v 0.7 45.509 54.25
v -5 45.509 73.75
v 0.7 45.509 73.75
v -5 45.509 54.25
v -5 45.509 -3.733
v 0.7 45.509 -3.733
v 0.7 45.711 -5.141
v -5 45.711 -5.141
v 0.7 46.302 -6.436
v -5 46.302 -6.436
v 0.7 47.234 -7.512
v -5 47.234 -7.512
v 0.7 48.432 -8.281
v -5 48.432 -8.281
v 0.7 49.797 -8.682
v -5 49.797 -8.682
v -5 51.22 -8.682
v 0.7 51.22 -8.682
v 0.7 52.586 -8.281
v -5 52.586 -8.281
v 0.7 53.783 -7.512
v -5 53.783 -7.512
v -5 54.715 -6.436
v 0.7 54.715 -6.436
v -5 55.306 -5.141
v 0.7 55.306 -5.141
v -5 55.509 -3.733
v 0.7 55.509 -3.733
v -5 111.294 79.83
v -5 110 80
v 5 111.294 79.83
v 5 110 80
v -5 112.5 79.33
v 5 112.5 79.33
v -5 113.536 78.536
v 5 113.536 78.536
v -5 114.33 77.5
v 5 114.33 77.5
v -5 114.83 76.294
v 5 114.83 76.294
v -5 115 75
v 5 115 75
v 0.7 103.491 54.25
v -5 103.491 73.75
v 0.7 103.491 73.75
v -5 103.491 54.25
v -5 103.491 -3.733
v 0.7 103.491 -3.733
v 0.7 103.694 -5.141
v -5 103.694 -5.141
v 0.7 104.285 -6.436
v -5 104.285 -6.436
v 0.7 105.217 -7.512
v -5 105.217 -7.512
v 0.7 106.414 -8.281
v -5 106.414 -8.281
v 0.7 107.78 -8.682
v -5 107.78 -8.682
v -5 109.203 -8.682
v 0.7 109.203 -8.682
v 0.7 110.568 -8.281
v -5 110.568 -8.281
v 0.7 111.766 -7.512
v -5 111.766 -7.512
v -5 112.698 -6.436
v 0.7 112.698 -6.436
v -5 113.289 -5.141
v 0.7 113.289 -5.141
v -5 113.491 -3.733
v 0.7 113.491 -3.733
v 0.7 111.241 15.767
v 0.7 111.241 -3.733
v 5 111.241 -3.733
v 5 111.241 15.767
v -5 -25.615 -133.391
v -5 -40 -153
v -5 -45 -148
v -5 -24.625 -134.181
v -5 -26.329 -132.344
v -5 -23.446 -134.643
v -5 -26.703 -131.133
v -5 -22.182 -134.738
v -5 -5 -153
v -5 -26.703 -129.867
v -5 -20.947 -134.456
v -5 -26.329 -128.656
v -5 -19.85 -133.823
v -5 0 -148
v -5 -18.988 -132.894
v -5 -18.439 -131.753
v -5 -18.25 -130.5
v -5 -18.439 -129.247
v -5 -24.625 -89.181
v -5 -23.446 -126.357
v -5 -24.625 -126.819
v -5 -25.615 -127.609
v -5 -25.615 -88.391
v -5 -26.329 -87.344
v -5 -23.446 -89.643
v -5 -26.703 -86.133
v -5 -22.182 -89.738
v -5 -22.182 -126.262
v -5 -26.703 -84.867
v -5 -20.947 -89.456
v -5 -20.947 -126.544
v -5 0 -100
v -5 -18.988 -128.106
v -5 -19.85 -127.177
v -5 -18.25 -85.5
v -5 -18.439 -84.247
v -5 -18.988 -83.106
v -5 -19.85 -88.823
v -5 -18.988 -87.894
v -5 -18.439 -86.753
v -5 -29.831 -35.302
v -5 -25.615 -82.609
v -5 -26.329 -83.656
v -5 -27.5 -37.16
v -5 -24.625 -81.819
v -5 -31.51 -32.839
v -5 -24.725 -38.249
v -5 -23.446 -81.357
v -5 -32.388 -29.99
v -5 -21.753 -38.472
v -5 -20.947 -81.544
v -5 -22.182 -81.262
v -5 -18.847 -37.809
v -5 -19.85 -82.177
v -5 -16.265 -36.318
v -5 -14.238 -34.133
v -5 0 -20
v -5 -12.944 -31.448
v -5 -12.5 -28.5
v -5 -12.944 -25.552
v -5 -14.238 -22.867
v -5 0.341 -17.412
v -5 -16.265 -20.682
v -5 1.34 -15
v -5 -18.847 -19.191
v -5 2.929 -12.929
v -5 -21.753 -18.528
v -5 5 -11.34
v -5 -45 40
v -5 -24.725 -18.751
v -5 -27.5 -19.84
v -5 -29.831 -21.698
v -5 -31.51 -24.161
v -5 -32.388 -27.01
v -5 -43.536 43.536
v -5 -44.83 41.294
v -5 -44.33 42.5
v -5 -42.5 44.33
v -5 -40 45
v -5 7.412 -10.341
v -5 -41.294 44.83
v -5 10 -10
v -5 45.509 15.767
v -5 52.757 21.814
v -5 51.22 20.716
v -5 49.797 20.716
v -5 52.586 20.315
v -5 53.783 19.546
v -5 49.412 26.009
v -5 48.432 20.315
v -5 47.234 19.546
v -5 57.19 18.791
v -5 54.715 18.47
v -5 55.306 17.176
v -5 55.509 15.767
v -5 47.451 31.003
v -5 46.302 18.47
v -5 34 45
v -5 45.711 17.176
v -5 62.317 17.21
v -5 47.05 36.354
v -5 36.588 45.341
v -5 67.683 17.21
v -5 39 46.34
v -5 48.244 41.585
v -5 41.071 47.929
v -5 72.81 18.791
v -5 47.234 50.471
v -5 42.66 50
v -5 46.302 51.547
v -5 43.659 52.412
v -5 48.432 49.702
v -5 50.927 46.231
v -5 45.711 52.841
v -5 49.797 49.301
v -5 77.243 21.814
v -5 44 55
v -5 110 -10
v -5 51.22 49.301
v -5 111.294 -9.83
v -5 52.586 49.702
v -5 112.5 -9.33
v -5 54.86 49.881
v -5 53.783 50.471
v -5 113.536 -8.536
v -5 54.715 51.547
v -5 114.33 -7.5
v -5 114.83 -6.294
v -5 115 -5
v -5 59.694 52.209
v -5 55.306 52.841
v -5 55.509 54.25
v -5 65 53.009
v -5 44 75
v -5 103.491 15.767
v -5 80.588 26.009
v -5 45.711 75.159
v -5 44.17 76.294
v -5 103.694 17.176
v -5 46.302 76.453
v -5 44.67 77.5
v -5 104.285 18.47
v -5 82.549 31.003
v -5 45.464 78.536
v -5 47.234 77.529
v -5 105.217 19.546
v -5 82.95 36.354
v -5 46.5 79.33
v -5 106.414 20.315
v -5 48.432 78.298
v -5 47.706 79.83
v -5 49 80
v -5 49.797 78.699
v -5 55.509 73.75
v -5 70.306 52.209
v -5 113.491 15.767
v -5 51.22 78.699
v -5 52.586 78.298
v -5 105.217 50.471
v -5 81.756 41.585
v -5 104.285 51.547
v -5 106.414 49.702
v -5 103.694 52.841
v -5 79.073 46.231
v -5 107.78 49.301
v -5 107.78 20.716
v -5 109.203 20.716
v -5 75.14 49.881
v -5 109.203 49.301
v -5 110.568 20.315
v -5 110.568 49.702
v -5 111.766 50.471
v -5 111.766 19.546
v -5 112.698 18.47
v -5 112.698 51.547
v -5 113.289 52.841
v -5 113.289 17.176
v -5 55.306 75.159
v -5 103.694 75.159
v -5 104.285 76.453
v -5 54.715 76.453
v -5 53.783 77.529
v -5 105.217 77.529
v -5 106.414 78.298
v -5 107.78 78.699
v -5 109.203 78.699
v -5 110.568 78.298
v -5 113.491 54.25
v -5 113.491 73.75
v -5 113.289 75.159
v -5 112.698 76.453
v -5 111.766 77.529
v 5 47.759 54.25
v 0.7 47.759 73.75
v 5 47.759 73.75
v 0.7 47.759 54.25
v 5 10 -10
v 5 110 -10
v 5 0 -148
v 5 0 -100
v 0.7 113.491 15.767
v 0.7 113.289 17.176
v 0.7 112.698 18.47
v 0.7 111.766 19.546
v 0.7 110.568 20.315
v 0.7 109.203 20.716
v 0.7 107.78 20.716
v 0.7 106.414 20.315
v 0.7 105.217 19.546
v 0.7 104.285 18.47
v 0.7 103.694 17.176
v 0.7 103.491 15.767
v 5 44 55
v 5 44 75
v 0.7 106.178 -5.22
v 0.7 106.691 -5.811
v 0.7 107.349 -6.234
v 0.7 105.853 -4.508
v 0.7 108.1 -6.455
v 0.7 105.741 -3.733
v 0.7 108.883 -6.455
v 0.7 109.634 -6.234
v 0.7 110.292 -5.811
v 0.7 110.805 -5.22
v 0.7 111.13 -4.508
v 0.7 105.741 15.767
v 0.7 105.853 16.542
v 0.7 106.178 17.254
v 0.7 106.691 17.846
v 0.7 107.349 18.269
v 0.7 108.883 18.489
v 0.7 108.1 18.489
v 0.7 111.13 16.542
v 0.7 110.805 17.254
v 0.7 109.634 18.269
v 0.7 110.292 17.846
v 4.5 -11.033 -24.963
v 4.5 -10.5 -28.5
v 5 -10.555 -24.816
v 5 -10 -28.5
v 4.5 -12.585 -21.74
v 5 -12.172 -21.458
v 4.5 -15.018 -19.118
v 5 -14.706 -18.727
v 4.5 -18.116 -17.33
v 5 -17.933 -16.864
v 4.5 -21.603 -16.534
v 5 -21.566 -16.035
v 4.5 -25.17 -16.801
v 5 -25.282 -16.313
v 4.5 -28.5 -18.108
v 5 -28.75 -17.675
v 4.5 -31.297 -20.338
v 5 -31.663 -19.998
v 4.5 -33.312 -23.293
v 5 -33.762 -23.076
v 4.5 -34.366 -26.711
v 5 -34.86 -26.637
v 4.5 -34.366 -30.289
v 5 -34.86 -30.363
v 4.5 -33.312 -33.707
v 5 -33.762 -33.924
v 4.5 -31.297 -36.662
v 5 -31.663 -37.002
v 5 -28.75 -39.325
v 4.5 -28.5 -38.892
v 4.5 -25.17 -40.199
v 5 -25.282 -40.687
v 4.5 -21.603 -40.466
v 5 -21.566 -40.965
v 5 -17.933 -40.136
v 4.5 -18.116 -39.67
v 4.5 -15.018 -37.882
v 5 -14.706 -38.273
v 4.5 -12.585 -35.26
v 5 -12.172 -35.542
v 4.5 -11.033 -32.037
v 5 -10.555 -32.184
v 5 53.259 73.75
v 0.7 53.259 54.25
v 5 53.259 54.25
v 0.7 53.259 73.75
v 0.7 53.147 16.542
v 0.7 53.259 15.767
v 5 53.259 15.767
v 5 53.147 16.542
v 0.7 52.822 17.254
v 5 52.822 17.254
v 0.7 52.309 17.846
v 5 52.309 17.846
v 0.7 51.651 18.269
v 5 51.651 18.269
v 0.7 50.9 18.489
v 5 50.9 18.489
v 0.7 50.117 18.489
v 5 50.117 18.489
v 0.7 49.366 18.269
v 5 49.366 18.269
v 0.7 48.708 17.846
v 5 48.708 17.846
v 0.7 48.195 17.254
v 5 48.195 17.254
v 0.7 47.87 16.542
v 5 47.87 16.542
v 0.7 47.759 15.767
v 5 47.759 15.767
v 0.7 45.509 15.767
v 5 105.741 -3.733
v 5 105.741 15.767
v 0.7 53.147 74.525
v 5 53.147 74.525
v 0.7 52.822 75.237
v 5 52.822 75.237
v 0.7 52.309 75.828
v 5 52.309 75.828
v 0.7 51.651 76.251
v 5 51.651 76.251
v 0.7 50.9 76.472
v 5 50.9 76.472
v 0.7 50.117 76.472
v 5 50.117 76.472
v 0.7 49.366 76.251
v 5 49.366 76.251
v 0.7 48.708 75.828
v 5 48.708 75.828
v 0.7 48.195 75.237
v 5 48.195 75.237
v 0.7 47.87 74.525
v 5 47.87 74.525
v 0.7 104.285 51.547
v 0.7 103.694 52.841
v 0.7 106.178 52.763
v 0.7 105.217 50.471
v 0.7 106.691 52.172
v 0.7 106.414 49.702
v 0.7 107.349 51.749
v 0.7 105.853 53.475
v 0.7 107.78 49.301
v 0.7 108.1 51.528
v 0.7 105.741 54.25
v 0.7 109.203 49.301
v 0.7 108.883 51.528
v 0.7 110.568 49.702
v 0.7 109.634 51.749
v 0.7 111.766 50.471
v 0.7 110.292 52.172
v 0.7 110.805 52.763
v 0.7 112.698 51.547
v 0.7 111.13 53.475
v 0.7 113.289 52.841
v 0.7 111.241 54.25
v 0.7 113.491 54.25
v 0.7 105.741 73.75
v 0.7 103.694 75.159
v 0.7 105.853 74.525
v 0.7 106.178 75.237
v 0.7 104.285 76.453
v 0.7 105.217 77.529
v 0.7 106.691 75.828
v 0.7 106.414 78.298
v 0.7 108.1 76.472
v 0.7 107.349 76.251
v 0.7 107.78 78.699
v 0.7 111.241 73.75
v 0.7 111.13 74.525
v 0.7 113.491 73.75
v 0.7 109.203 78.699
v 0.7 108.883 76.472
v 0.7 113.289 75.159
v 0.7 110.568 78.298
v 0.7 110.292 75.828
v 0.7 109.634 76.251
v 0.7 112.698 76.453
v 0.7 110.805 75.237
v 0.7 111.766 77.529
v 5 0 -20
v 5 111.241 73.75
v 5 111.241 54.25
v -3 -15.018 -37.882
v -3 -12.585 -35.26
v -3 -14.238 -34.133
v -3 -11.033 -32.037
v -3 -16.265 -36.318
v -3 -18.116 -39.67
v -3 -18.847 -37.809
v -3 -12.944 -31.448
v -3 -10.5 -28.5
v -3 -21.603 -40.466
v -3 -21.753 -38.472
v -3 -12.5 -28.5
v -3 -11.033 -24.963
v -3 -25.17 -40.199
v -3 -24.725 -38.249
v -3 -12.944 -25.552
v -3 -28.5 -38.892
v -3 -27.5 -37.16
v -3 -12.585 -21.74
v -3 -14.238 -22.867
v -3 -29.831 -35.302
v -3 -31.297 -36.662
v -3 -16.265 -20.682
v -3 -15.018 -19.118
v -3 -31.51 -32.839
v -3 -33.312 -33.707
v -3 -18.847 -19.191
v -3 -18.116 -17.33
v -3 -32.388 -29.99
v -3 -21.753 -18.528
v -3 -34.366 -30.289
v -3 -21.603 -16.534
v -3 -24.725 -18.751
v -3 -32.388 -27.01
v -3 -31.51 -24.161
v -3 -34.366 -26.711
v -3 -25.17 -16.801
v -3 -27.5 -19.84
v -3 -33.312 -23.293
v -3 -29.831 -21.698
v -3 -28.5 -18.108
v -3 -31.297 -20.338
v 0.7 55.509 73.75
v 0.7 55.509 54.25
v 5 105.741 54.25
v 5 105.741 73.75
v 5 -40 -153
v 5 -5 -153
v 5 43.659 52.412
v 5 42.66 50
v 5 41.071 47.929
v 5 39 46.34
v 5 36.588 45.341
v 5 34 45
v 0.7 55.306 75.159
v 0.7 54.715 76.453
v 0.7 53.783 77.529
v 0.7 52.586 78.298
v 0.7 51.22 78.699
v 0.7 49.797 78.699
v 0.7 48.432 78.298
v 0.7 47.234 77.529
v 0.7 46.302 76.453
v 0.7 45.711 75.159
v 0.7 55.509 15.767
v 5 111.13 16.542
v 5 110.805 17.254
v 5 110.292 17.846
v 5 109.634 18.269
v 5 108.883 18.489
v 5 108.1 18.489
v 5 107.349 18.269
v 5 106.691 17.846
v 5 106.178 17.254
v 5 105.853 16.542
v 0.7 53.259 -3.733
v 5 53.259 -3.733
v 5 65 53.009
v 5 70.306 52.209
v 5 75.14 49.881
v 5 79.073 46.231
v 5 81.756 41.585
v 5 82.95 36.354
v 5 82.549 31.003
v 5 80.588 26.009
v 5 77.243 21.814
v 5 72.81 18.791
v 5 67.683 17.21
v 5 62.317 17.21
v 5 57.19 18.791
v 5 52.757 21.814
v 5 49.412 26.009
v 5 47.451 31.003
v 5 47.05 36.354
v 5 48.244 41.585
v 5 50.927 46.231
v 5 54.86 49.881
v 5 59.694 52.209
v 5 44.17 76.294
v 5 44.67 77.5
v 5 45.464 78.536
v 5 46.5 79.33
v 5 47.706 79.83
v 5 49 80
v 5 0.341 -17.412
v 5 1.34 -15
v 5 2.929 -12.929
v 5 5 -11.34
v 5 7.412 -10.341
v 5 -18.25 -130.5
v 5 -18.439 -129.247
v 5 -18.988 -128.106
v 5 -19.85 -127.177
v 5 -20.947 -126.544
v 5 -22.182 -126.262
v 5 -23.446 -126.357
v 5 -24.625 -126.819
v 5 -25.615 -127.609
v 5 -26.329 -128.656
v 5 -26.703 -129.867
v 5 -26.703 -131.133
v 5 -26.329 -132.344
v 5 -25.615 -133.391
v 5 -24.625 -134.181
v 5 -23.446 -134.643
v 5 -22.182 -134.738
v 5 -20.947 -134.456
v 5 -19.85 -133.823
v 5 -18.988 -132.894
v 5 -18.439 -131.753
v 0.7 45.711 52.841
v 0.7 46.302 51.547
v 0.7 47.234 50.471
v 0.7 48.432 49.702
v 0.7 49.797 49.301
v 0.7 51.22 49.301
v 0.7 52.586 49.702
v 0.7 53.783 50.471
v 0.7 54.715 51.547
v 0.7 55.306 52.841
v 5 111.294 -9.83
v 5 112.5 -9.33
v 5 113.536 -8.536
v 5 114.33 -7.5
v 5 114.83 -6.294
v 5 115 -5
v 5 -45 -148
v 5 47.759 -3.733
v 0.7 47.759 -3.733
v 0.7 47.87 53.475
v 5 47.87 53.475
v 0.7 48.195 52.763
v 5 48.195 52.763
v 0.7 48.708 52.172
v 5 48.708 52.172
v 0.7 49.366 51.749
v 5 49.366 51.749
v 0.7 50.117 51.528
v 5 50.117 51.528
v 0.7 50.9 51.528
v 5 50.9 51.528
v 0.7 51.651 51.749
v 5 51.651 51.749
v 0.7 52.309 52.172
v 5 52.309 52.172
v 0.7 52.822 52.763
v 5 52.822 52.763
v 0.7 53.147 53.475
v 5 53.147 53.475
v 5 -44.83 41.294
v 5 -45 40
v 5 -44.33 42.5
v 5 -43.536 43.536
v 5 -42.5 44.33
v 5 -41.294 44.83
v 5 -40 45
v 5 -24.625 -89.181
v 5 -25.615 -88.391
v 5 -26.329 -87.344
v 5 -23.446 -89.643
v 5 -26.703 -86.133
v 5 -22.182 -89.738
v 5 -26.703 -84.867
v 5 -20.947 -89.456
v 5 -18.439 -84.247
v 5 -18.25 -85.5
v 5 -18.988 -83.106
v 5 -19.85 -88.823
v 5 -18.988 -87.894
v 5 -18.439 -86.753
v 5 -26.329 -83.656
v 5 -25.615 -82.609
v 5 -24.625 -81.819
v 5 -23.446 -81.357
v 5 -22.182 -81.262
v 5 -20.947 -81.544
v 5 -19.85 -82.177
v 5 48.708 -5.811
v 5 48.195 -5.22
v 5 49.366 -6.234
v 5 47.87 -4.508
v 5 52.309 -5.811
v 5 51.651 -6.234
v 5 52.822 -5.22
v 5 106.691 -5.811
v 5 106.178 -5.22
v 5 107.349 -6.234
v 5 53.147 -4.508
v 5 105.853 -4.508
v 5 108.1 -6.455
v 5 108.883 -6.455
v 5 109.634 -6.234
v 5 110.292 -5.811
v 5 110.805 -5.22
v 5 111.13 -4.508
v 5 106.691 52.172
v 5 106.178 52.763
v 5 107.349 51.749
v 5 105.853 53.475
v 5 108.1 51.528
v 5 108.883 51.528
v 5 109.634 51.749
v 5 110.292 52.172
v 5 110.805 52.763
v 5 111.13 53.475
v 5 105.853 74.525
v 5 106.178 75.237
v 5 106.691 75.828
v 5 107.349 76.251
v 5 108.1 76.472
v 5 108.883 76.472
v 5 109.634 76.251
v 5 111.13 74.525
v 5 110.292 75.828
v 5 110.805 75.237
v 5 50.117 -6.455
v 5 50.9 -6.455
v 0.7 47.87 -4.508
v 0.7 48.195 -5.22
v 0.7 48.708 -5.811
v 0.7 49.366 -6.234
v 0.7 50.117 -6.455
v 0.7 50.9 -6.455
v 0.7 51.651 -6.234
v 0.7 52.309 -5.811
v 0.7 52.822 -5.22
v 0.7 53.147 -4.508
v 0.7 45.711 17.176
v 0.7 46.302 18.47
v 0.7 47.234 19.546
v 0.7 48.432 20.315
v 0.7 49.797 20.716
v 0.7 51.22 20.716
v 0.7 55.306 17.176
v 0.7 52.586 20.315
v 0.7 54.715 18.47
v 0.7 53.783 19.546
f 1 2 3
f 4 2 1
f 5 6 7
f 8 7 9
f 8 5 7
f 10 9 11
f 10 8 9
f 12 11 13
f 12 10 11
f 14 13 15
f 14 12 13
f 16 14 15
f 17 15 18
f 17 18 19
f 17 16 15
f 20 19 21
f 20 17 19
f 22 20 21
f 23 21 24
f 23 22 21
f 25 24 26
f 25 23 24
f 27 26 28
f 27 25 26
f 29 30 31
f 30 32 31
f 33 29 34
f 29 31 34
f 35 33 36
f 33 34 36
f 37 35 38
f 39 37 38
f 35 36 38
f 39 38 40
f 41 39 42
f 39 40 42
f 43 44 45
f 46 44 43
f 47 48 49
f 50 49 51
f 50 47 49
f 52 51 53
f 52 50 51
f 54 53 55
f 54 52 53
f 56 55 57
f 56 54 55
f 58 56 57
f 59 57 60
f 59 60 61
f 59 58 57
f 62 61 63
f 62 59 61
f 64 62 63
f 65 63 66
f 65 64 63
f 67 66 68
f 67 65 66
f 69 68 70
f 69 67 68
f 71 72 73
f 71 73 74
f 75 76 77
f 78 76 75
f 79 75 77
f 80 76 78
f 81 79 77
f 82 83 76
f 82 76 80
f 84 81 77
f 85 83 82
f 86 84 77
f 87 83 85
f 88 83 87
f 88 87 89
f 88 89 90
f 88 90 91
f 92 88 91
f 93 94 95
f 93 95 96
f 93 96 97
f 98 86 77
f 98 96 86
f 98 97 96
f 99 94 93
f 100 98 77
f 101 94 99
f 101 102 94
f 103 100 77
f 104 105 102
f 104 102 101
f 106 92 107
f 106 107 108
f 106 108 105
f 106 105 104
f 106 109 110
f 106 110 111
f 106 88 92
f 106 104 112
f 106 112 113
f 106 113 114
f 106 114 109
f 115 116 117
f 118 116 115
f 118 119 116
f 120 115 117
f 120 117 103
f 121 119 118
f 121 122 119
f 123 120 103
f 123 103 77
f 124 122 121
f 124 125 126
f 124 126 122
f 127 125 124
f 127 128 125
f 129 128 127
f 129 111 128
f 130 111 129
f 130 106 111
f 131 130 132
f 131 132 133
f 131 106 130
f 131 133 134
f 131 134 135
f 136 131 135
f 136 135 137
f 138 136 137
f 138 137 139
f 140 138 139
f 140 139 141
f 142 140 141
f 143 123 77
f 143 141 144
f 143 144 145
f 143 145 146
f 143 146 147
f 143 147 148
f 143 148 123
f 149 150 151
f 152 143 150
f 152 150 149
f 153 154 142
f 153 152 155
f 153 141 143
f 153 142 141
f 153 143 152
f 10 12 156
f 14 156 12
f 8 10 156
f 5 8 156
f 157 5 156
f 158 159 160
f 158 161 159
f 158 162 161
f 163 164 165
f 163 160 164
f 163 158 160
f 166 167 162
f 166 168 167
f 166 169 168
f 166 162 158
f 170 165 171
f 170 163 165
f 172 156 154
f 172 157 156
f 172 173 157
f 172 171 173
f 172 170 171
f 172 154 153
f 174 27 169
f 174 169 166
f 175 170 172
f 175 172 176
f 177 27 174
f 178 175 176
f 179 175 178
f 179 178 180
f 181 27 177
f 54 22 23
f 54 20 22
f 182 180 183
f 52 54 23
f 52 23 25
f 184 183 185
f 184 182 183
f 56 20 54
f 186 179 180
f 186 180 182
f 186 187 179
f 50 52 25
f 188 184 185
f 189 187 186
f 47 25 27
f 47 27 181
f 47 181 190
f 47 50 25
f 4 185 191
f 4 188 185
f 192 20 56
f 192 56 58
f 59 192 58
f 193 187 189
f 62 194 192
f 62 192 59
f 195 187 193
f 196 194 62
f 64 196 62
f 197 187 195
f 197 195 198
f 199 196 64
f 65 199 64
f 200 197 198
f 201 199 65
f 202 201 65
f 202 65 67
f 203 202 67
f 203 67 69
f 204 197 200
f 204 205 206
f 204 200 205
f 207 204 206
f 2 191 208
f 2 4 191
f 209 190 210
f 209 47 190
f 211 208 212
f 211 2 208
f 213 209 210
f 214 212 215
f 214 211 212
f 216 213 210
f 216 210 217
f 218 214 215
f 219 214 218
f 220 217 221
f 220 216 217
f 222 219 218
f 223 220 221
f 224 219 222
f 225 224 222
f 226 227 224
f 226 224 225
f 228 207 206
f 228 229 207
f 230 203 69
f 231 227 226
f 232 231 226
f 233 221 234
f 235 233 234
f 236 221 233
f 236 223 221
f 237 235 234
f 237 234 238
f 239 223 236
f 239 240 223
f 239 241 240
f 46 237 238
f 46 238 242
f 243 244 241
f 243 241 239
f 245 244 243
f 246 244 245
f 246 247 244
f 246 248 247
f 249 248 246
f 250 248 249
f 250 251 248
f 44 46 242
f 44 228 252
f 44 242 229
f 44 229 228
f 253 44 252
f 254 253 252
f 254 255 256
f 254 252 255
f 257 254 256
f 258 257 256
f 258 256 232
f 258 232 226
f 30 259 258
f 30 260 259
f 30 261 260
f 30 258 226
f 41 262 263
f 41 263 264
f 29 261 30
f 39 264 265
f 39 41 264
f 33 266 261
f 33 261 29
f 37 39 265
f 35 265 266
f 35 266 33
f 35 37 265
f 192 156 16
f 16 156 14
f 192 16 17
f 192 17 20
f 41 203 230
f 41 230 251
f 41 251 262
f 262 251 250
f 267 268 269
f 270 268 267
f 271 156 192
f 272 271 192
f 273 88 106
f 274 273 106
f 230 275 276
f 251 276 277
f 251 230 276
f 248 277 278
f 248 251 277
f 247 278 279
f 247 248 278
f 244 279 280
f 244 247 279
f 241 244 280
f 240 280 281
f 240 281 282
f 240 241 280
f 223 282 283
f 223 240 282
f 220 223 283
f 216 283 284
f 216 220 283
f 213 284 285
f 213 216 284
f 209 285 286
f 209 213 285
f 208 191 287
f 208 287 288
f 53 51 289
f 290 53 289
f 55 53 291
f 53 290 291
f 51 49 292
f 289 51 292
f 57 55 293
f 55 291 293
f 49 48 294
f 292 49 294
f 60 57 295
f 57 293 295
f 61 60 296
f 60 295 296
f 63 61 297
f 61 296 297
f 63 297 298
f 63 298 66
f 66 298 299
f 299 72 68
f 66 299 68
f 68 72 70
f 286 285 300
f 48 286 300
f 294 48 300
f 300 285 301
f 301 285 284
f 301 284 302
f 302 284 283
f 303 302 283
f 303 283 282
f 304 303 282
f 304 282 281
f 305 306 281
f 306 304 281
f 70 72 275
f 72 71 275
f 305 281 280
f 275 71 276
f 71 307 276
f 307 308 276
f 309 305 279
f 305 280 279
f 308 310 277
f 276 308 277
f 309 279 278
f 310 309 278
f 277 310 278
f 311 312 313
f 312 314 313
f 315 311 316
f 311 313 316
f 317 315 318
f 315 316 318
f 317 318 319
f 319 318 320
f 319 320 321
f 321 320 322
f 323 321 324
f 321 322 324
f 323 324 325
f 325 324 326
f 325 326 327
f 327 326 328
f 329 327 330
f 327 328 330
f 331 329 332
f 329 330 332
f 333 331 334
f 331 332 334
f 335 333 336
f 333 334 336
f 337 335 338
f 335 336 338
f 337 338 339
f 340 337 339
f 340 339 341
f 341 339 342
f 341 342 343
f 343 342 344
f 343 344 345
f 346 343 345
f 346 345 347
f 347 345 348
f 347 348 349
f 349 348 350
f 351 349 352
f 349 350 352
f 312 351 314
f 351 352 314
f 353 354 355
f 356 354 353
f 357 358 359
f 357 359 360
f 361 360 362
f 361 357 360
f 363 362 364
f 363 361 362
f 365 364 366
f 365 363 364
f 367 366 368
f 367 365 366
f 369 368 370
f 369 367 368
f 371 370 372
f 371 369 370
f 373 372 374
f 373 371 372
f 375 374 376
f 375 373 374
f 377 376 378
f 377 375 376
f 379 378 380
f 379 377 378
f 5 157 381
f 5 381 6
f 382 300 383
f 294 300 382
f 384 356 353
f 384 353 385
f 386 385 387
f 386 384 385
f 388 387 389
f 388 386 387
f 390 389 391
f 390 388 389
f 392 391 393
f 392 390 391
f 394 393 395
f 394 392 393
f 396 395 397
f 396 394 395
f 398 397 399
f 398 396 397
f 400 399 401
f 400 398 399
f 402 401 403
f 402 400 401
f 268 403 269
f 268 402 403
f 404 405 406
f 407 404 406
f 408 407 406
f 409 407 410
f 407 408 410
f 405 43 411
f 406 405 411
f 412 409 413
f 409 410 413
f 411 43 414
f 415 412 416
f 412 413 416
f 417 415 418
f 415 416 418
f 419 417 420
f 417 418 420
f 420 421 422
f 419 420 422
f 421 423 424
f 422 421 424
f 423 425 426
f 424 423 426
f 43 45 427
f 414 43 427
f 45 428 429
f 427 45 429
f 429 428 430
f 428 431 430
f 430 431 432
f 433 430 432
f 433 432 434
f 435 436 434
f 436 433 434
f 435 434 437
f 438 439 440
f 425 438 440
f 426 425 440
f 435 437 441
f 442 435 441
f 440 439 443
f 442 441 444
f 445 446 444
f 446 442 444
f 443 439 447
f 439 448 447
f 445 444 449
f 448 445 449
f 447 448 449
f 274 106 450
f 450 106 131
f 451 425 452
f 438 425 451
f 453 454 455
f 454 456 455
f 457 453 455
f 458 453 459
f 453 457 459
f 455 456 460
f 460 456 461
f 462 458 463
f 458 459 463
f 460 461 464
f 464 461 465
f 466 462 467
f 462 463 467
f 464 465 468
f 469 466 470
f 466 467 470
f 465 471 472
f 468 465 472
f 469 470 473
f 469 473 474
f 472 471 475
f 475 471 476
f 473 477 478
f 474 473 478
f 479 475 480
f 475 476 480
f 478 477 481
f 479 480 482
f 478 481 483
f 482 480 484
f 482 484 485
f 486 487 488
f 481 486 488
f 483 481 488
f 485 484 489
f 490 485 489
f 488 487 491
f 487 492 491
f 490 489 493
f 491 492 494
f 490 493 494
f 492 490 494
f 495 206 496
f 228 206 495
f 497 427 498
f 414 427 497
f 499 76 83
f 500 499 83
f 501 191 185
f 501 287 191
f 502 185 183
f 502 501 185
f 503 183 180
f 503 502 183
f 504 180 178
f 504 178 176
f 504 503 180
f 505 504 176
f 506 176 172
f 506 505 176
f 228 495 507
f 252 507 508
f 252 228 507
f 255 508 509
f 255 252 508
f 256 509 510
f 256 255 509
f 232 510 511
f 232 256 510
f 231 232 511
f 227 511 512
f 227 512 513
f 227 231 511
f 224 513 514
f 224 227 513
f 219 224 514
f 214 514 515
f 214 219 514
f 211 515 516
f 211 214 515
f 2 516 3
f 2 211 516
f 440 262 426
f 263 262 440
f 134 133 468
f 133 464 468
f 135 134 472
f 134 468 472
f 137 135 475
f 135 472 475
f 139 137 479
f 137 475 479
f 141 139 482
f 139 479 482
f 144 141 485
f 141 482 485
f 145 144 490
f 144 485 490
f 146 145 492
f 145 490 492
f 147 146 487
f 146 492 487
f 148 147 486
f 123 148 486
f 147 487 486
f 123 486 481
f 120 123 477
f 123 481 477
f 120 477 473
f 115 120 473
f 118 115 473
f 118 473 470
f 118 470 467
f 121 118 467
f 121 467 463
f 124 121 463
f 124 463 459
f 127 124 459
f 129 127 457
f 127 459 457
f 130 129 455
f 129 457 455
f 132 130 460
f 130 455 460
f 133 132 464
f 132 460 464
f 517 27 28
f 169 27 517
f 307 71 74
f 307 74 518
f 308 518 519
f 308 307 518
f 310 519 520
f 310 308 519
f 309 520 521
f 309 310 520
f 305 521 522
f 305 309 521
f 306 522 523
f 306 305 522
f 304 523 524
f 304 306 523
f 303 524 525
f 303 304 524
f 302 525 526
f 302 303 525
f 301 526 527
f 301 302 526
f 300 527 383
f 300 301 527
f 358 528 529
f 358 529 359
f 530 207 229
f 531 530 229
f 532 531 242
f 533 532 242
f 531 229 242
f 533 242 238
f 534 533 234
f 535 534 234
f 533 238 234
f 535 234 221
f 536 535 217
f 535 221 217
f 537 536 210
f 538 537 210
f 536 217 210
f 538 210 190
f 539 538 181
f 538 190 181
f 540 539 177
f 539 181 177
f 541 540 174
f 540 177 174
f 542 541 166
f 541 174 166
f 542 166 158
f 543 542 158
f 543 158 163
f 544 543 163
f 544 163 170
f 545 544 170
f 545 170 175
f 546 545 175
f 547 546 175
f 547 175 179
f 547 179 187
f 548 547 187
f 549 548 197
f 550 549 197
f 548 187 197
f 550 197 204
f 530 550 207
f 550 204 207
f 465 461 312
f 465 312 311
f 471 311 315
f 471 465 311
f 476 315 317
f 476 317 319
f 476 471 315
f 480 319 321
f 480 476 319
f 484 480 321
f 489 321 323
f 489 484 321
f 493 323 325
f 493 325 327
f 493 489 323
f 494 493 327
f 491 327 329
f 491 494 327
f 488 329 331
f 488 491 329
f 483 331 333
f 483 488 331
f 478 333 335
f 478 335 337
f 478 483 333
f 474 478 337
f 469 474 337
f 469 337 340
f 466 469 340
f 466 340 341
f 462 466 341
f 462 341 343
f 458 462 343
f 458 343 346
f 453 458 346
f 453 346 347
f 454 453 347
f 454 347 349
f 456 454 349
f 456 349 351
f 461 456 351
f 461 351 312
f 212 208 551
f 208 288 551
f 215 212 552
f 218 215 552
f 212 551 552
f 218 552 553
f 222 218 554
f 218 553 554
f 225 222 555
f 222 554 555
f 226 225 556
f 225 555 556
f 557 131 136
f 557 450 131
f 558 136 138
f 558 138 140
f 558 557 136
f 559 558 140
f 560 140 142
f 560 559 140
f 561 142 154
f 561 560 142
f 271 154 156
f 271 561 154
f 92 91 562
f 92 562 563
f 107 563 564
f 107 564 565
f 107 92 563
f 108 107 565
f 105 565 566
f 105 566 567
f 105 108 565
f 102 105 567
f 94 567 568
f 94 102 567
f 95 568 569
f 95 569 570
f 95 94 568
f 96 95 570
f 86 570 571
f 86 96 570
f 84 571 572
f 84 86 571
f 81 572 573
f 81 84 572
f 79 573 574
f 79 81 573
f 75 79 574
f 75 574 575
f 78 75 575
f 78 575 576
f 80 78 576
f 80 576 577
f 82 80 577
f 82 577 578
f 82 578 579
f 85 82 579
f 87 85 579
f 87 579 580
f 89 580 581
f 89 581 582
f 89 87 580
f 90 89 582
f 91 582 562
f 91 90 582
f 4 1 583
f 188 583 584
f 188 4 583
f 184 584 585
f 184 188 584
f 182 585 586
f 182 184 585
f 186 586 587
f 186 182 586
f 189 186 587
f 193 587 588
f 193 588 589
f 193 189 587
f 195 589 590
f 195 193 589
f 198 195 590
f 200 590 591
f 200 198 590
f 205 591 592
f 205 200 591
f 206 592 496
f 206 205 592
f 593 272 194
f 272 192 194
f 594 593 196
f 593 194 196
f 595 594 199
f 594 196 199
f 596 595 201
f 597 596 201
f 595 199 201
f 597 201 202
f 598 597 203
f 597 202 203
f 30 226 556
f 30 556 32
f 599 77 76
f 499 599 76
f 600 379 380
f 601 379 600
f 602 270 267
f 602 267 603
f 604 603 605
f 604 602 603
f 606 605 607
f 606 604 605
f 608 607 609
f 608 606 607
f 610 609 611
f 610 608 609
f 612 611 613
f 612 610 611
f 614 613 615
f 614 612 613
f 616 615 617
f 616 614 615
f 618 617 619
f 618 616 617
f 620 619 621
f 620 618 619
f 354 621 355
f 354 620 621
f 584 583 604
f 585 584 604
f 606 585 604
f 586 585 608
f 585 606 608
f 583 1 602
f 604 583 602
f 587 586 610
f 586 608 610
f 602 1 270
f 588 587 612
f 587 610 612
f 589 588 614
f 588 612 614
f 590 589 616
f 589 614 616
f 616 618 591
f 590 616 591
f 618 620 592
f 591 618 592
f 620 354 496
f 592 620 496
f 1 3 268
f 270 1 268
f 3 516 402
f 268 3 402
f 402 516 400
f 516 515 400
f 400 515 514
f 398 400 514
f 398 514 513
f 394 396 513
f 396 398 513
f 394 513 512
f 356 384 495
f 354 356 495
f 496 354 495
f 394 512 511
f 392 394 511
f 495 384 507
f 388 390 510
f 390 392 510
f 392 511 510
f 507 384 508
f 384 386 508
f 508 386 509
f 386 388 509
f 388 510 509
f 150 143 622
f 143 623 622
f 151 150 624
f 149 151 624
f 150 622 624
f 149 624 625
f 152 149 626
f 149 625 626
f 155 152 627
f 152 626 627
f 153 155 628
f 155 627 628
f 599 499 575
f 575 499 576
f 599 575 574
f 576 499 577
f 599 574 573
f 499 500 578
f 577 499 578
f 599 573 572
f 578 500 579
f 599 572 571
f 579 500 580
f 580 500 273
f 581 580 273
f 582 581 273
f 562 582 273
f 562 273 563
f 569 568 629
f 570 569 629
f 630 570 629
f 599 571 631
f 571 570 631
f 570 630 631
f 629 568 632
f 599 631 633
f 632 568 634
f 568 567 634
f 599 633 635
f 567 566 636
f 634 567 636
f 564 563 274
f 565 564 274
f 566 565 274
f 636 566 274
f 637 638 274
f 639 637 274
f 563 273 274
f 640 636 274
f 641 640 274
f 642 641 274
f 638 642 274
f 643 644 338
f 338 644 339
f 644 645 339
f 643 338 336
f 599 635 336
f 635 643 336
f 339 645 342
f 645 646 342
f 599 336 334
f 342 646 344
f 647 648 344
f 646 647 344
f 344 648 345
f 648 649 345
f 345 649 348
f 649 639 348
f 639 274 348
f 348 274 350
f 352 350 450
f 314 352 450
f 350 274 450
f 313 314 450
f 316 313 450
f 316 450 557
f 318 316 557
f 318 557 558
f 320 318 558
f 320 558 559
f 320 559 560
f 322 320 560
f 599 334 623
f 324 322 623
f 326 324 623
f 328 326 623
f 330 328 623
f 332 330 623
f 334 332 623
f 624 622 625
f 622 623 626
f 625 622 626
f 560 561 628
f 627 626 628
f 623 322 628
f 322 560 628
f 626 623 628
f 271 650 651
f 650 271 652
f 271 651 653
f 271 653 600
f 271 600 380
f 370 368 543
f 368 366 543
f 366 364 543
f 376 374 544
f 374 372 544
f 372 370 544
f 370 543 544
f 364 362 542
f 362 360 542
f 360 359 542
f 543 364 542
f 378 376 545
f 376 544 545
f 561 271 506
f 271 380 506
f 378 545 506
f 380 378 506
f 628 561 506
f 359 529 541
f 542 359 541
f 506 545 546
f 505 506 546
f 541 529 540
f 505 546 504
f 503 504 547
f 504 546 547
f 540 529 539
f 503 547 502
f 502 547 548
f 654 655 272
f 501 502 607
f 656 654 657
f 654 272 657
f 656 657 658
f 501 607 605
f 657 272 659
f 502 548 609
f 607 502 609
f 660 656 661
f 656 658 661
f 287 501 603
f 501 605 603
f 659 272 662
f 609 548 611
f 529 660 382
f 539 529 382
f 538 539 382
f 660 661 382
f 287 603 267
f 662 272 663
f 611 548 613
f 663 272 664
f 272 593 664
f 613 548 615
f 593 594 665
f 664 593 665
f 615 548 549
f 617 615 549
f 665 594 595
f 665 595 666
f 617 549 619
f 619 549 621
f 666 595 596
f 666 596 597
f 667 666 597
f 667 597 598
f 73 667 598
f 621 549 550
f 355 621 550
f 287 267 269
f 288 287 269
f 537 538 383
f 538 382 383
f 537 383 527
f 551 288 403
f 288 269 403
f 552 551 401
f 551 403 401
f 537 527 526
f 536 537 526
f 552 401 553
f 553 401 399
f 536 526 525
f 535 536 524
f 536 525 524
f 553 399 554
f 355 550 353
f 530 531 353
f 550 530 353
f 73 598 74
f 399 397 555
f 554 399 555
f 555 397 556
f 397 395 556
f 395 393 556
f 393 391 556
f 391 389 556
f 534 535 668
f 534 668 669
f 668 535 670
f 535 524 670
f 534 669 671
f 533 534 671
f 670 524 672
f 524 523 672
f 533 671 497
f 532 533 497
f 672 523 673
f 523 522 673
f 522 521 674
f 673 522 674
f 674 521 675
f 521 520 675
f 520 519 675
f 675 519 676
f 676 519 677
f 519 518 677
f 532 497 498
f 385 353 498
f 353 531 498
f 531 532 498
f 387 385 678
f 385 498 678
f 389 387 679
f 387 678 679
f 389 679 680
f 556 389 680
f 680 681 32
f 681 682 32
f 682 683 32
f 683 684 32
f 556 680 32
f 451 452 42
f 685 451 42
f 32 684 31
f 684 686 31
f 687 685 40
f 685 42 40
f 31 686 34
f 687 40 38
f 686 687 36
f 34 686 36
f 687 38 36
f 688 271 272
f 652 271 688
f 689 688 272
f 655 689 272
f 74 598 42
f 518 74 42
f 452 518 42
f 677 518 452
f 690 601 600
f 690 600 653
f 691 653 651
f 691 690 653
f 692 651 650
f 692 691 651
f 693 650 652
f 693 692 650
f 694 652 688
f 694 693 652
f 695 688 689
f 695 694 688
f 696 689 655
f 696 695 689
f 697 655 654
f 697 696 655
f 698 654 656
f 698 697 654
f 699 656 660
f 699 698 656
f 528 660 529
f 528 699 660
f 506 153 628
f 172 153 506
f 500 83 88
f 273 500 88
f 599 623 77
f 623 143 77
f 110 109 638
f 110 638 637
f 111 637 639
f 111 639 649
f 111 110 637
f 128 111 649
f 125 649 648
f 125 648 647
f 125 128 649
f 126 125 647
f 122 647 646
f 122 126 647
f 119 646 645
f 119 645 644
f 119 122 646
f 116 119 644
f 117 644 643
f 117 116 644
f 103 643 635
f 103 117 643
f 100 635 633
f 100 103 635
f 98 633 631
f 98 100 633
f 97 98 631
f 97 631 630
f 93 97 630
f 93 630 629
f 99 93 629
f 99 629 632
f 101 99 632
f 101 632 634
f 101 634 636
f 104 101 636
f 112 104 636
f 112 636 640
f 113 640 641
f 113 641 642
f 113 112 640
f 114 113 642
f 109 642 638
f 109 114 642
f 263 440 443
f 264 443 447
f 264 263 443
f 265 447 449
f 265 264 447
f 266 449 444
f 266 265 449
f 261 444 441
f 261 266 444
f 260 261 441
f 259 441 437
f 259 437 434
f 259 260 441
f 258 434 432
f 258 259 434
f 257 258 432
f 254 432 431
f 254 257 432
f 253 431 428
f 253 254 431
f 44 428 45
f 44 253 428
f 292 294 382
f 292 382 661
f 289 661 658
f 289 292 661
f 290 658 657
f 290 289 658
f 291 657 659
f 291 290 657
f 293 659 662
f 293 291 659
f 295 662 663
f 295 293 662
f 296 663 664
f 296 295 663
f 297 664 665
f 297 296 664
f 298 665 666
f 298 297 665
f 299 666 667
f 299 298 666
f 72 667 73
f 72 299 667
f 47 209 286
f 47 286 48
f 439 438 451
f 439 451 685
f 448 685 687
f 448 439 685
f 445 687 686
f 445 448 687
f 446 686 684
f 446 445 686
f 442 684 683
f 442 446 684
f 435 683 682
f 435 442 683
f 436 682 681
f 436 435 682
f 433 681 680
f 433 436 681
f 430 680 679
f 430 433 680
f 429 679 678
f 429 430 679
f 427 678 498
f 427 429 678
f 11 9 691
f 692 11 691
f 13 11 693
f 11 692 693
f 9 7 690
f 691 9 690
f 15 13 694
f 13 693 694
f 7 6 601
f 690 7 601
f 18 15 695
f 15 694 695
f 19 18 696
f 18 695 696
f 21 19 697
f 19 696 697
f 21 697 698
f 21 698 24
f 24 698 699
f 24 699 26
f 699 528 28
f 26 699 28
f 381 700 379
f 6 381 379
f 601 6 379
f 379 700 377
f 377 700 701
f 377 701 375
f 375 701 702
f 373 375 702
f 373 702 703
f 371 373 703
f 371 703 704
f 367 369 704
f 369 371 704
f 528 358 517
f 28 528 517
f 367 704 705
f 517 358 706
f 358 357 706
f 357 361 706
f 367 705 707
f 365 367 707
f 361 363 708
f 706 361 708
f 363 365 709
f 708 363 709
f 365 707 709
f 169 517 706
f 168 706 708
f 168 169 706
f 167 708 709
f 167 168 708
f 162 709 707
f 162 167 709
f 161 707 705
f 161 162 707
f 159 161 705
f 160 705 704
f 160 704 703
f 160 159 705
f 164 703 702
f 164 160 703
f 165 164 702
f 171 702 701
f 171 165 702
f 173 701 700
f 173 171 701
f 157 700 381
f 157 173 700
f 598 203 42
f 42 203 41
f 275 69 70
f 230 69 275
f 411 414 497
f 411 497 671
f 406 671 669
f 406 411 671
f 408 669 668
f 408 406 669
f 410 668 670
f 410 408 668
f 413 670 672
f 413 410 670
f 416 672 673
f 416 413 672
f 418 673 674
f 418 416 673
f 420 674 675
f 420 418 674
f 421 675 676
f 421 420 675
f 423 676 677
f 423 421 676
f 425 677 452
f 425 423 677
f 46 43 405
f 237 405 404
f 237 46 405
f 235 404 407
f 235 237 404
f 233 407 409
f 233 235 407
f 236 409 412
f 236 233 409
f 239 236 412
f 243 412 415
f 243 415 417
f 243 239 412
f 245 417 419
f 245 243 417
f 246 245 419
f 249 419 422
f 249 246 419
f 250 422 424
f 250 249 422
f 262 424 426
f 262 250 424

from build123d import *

# Parameters (mm, degrees)
EXTRUDE_1_OUTLINE_W     = 2
EXTRUDE_1_OUTLINE_H     = 2
EXTRUDE_START           = -5
EXTRUDE_1_2_OUTLINE_R   = 4.25
EXTRUDE_1_2_OUTLINE_R_2 = 12
EXTRUDE_1_2_DEPTH       = 10
SKETCH_2_W              = 80
SKETCH_2_H              = 71
EXTRUDE_2_DEPTH         = 10
HOLE_START              = -6
HOLE_WIZARD_4_DEPTH     = 6.7
HOLE_START_2            = 0.7
HOLE_WIZARD_4_2_DEPTH   = 5.3
SKETCH_7_R              = 18
CUT_EXTRUDE_1_DEPTH     = 10
FILLET_2_R              = 5
FILLET_3_R              = 5
SKETCH_8_W              = 52.674698886
SKETCH_8_H              = 88.999999996
EXTRUDE_3_DEPTH         = 10
SKETCH_9_W              = 90.000000011
SKETCH_9_H              = 126.81088124
CUT_EXTRUDE_2_DEPTH     = 10
FILLET_4_R              = 10
FILLET_6_R              = 5


with BuildPart() as part:
    # 凸台-拉伸1: read off the stored shape, not the designer's step
    # 凸台-拉伸1 outline → 凸台-拉伸1 (revolve)
    with BuildSketch(Plane(origin=(0, -22.5, -28.5), x_dir=(0, 1, 0), z_dir=(0, 0, -1))):
        with Locations((11, -4)):
            Rectangle(EXTRUDE_1_OUTLINE_W, EXTRUDE_1_OUTLINE_H)
    revolve(axis=Axis((0, -22.5, -28.5), (1, 0, 0)))

    # Extrude 1 2 outline → Extrude 1 2 (add)
    with BuildSketch(Plane.YZ.offset(EXTRUDE_START)):
        with BuildLine():
            Line((114.999999996, 0), (-40, 0))
            ThreePointArc((-40, 0), (-43.535533906, -1.464466094), (-45, -5))
            Line((-45, -5), (-45, -148))
            Line((-45, -148), (-40, -153))
            Line((-40, -153), (-5, -153))
            Line((-5, -153), (1.7e-08, -147.999999983))
            Line((1.7e-08, -147.999999983), (0, -100))
            ThreePointArc((0, -100), (2.928932188, -92.928932188), (10, -90))
            Line((10, -90), (114.999999996, -90))
            Line((114.999999996, -90), (114.999999996, 0))
        make_face()
        with Locations((-22.5, -130.5)):
            Circle(EXTRUDE_1_2_OUTLINE_R, mode=Mode.SUBTRACT)
        with Locations((-22.5, -85.5)):
            Circle(EXTRUDE_1_2_OUTLINE_R, mode=Mode.SUBTRACT)
        with Locations((-22.5, -28.5)):
            Circle(EXTRUDE_1_2_OUTLINE_R_2, mode=Mode.SUBTRACT)
    extrude(amount=EXTRUDE_1_2_DEPTH)

    # Extrude 1 3 outline → Extrude 1 3 (revolve, cut)
    with BuildSketch(Plane(origin=(0, -22.5, -28.5), x_dir=(0, 1, 0), z_dir=(0, 0, -1))):
        Polygon((12, 5), (12, 4.5), (12.5, 5), align=None)
    revolve(axis=Axis((0, -22.5, -28.5), (1, 0, 0)), mode=Mode.SUBTRACT)

    # 草图2 → 凸台-拉伸2 (add)
    with BuildSketch(Plane.ZY.offset(5)):
        with Locations((40, 79.499999996)):
            Rectangle(SKETCH_2_W, SKETCH_2_H)
    extrude(amount=-EXTRUDE_2_DEPTH)

    # 打孔尺寸(%根据)内六角圆柱头螺钉的类型4: read off the stored shape, not the designer's step
    # 打孔尺寸(%根据)内六角圆柱头螺钉的类型4 outline → 打孔尺寸(%根据)内六角圆柱头螺钉的类型4 (cut)
    with BuildSketch(Plane.YZ.offset(HOLE_START)):
        with BuildLine():
            ThreePointArc((45.508621967, -3.732756057), (50.508621967, -8.732756057), (55.508621967, -3.732756057))
            Line((55.508621967, -3.732756057), (55.508621967, 15.767243943))
            ThreePointArc((55.508621967, 15.767243943), (50.508621967, 20.767243943), (45.508621967, 15.767243943))
            Line((45.508621967, 15.767243943), (45.508621967, -3.732756057))
        make_face()
        with BuildLine():
            ThreePointArc((55.508621967, 73.75), (50.508621967, 78.75), (45.508621967, 73.75))
            Line((45.508621967, 73.75), (45.508621967, 54.25))
            ThreePointArc((45.508621967, 54.25), (50.508621967, 49.25), (55.508621967, 54.25))
            Line((55.508621967, 54.25), (55.508621967, 73.75))
        make_face()
        with BuildLine():
            ThreePointArc((103.491378024, 54.25), (108.491378024, 49.25), (113.491378024, 54.25))
            Line((113.491378024, 54.25), (113.491378024, 73.75))
            ThreePointArc((113.491378024, 73.75), (108.491378024, 78.75), (103.491378024, 73.75))
            Line((103.491378024, 73.75), (103.491378024, 54.25))
        make_face()
        with BuildLine():
            ThreePointArc((113.491378024, 15.767243943), (108.491378024, 20.767243943), (103.491378024, 15.767243943))
            Line((103.491378024, 15.767243943), (103.491378024, -3.732756057))
            ThreePointArc((103.491378024, -3.732756057), (108.491378024, -8.732756057), (113.491378024, -3.732756057))
            Line((113.491378024, -3.732756057), (113.491378024, 15.767243943))
        make_face()
    extrude(amount=HOLE_WIZARD_4_DEPTH, mode=Mode.SUBTRACT)

    # Hole Wizard 4 2 outline → Hole Wizard 4 2 (cut)
    with BuildSketch(Plane.YZ.offset(HOLE_START_2)):
        with BuildLine():
            ThreePointArc((47.758621967, -3.732756057), (50.508621967, -6.482756057), (53.258621967, -3.732756057))
            Line((53.258621967, -3.732756057), (53.258621967, 15.767243943))
            ThreePointArc((53.258621967, 15.767243943), (50.508621967, 18.517243943), (47.758621967, 15.767243943))
            Line((47.758621967, 15.767243943), (47.758621967, -3.732756057))
        make_face()
        with BuildLine():
            ThreePointArc((53.258621967, 73.75), (50.508621967, 76.5), (47.758621967, 73.75))
            Line((47.758621967, 73.75), (47.758621967, 54.25))
            ThreePointArc((47.758621967, 54.25), (50.508621967, 51.5), (53.258621967, 54.25))
            Line((53.258621967, 54.25), (53.258621967, 73.75))
        make_face()
        with BuildLine():
            ThreePointArc((105.741378024, 54.25), (108.491378024, 51.5), (111.241378024, 54.25))
            Line((111.241378024, 54.25), (111.241378024, 73.75))
            ThreePointArc((111.241378024, 73.75), (108.491378024, 76.5), (105.741378024, 73.75))
            Line((105.741378024, 73.75), (105.741378024, 54.25))
        make_face()
        with BuildLine():
            ThreePointArc((111.241378024, 15.767243943), (108.491378024, 18.517243943), (105.741378024, 15.767243943))
            Line((105.741378024, 15.767243943), (105.741378024, -3.732756057))
            ThreePointArc((105.741378024, -3.732756057), (108.491378024, -6.482756057), (111.241378024, -3.732756057))
            Line((111.241378024, -3.732756057), (111.241378024, 15.767243943))
        make_face()
    extrude(amount=HOLE_WIZARD_4_2_DEPTH, mode=Mode.SUBTRACT)

    # 草图7 → 切除-拉伸1 (cut)
    with BuildSketch(Plane.ZY.offset(5)):
        with Locations((35.008621971, 64.999999996)):
            Circle(SKETCH_7_R)
    extrude(amount=-CUT_EXTRUDE_1_DEPTH, mode=Mode.SUBTRACT)

    # 圆角2
    fillet_2_edges = [part.edges().sort_by_distance(p)[0] for p in [
        (0, 114.999999996, -90),
        (0, 114.999999996, 80),
        (0, 43.999999996, 80),
    ]]
    fillet(fillet_2_edges, radius=FILLET_2_R)

    # 圆角3
    fillet_3_edges = [part.edges().sort_by_distance(p)[0] for p in [
        (0, 43.999999996, 0),
    ]]
    fillet(fillet_3_edges, radius=FILLET_3_R)

    # 草图8 → 凸台-拉伸3 (add)
    with BuildSketch(Plane.ZY.offset(5)):
        with Locations((18.662650557, -0.500000002)):
            Rectangle(SKETCH_8_W, SKETCH_8_H)
    extrude(amount=-EXTRUDE_3_DEPTH)

    # 草图9 → 切除-拉伸2 (cut)
    with BuildSketch(Plane.ZY.offset(5)):
        with Locations((-54.999999997, 63.40544062)):
            Rectangle(SKETCH_9_W, SKETCH_9_H)
    extrude(amount=-CUT_EXTRUDE_2_DEPTH, mode=Mode.SUBTRACT)

    # 圆角4
    fillet_4_edges = [part.edges().sort_by_distance(p)[0] for p in [
        (0, 43.999999996, 45),
        (0, 0, -9.999999991),
    ]]
    fillet(fillet_4_edges, radius=FILLET_4_R)

    # 圆角6
    fillet_6_edges = [part.edges().sort_by_distance(p)[0] for p in [
        (0, -45, 45),
        (0, 114.999999996, -9.999999991),
    ]]
    fillet(fillet_6_edges, radius=FILLET_6_R)


solid = part.part
